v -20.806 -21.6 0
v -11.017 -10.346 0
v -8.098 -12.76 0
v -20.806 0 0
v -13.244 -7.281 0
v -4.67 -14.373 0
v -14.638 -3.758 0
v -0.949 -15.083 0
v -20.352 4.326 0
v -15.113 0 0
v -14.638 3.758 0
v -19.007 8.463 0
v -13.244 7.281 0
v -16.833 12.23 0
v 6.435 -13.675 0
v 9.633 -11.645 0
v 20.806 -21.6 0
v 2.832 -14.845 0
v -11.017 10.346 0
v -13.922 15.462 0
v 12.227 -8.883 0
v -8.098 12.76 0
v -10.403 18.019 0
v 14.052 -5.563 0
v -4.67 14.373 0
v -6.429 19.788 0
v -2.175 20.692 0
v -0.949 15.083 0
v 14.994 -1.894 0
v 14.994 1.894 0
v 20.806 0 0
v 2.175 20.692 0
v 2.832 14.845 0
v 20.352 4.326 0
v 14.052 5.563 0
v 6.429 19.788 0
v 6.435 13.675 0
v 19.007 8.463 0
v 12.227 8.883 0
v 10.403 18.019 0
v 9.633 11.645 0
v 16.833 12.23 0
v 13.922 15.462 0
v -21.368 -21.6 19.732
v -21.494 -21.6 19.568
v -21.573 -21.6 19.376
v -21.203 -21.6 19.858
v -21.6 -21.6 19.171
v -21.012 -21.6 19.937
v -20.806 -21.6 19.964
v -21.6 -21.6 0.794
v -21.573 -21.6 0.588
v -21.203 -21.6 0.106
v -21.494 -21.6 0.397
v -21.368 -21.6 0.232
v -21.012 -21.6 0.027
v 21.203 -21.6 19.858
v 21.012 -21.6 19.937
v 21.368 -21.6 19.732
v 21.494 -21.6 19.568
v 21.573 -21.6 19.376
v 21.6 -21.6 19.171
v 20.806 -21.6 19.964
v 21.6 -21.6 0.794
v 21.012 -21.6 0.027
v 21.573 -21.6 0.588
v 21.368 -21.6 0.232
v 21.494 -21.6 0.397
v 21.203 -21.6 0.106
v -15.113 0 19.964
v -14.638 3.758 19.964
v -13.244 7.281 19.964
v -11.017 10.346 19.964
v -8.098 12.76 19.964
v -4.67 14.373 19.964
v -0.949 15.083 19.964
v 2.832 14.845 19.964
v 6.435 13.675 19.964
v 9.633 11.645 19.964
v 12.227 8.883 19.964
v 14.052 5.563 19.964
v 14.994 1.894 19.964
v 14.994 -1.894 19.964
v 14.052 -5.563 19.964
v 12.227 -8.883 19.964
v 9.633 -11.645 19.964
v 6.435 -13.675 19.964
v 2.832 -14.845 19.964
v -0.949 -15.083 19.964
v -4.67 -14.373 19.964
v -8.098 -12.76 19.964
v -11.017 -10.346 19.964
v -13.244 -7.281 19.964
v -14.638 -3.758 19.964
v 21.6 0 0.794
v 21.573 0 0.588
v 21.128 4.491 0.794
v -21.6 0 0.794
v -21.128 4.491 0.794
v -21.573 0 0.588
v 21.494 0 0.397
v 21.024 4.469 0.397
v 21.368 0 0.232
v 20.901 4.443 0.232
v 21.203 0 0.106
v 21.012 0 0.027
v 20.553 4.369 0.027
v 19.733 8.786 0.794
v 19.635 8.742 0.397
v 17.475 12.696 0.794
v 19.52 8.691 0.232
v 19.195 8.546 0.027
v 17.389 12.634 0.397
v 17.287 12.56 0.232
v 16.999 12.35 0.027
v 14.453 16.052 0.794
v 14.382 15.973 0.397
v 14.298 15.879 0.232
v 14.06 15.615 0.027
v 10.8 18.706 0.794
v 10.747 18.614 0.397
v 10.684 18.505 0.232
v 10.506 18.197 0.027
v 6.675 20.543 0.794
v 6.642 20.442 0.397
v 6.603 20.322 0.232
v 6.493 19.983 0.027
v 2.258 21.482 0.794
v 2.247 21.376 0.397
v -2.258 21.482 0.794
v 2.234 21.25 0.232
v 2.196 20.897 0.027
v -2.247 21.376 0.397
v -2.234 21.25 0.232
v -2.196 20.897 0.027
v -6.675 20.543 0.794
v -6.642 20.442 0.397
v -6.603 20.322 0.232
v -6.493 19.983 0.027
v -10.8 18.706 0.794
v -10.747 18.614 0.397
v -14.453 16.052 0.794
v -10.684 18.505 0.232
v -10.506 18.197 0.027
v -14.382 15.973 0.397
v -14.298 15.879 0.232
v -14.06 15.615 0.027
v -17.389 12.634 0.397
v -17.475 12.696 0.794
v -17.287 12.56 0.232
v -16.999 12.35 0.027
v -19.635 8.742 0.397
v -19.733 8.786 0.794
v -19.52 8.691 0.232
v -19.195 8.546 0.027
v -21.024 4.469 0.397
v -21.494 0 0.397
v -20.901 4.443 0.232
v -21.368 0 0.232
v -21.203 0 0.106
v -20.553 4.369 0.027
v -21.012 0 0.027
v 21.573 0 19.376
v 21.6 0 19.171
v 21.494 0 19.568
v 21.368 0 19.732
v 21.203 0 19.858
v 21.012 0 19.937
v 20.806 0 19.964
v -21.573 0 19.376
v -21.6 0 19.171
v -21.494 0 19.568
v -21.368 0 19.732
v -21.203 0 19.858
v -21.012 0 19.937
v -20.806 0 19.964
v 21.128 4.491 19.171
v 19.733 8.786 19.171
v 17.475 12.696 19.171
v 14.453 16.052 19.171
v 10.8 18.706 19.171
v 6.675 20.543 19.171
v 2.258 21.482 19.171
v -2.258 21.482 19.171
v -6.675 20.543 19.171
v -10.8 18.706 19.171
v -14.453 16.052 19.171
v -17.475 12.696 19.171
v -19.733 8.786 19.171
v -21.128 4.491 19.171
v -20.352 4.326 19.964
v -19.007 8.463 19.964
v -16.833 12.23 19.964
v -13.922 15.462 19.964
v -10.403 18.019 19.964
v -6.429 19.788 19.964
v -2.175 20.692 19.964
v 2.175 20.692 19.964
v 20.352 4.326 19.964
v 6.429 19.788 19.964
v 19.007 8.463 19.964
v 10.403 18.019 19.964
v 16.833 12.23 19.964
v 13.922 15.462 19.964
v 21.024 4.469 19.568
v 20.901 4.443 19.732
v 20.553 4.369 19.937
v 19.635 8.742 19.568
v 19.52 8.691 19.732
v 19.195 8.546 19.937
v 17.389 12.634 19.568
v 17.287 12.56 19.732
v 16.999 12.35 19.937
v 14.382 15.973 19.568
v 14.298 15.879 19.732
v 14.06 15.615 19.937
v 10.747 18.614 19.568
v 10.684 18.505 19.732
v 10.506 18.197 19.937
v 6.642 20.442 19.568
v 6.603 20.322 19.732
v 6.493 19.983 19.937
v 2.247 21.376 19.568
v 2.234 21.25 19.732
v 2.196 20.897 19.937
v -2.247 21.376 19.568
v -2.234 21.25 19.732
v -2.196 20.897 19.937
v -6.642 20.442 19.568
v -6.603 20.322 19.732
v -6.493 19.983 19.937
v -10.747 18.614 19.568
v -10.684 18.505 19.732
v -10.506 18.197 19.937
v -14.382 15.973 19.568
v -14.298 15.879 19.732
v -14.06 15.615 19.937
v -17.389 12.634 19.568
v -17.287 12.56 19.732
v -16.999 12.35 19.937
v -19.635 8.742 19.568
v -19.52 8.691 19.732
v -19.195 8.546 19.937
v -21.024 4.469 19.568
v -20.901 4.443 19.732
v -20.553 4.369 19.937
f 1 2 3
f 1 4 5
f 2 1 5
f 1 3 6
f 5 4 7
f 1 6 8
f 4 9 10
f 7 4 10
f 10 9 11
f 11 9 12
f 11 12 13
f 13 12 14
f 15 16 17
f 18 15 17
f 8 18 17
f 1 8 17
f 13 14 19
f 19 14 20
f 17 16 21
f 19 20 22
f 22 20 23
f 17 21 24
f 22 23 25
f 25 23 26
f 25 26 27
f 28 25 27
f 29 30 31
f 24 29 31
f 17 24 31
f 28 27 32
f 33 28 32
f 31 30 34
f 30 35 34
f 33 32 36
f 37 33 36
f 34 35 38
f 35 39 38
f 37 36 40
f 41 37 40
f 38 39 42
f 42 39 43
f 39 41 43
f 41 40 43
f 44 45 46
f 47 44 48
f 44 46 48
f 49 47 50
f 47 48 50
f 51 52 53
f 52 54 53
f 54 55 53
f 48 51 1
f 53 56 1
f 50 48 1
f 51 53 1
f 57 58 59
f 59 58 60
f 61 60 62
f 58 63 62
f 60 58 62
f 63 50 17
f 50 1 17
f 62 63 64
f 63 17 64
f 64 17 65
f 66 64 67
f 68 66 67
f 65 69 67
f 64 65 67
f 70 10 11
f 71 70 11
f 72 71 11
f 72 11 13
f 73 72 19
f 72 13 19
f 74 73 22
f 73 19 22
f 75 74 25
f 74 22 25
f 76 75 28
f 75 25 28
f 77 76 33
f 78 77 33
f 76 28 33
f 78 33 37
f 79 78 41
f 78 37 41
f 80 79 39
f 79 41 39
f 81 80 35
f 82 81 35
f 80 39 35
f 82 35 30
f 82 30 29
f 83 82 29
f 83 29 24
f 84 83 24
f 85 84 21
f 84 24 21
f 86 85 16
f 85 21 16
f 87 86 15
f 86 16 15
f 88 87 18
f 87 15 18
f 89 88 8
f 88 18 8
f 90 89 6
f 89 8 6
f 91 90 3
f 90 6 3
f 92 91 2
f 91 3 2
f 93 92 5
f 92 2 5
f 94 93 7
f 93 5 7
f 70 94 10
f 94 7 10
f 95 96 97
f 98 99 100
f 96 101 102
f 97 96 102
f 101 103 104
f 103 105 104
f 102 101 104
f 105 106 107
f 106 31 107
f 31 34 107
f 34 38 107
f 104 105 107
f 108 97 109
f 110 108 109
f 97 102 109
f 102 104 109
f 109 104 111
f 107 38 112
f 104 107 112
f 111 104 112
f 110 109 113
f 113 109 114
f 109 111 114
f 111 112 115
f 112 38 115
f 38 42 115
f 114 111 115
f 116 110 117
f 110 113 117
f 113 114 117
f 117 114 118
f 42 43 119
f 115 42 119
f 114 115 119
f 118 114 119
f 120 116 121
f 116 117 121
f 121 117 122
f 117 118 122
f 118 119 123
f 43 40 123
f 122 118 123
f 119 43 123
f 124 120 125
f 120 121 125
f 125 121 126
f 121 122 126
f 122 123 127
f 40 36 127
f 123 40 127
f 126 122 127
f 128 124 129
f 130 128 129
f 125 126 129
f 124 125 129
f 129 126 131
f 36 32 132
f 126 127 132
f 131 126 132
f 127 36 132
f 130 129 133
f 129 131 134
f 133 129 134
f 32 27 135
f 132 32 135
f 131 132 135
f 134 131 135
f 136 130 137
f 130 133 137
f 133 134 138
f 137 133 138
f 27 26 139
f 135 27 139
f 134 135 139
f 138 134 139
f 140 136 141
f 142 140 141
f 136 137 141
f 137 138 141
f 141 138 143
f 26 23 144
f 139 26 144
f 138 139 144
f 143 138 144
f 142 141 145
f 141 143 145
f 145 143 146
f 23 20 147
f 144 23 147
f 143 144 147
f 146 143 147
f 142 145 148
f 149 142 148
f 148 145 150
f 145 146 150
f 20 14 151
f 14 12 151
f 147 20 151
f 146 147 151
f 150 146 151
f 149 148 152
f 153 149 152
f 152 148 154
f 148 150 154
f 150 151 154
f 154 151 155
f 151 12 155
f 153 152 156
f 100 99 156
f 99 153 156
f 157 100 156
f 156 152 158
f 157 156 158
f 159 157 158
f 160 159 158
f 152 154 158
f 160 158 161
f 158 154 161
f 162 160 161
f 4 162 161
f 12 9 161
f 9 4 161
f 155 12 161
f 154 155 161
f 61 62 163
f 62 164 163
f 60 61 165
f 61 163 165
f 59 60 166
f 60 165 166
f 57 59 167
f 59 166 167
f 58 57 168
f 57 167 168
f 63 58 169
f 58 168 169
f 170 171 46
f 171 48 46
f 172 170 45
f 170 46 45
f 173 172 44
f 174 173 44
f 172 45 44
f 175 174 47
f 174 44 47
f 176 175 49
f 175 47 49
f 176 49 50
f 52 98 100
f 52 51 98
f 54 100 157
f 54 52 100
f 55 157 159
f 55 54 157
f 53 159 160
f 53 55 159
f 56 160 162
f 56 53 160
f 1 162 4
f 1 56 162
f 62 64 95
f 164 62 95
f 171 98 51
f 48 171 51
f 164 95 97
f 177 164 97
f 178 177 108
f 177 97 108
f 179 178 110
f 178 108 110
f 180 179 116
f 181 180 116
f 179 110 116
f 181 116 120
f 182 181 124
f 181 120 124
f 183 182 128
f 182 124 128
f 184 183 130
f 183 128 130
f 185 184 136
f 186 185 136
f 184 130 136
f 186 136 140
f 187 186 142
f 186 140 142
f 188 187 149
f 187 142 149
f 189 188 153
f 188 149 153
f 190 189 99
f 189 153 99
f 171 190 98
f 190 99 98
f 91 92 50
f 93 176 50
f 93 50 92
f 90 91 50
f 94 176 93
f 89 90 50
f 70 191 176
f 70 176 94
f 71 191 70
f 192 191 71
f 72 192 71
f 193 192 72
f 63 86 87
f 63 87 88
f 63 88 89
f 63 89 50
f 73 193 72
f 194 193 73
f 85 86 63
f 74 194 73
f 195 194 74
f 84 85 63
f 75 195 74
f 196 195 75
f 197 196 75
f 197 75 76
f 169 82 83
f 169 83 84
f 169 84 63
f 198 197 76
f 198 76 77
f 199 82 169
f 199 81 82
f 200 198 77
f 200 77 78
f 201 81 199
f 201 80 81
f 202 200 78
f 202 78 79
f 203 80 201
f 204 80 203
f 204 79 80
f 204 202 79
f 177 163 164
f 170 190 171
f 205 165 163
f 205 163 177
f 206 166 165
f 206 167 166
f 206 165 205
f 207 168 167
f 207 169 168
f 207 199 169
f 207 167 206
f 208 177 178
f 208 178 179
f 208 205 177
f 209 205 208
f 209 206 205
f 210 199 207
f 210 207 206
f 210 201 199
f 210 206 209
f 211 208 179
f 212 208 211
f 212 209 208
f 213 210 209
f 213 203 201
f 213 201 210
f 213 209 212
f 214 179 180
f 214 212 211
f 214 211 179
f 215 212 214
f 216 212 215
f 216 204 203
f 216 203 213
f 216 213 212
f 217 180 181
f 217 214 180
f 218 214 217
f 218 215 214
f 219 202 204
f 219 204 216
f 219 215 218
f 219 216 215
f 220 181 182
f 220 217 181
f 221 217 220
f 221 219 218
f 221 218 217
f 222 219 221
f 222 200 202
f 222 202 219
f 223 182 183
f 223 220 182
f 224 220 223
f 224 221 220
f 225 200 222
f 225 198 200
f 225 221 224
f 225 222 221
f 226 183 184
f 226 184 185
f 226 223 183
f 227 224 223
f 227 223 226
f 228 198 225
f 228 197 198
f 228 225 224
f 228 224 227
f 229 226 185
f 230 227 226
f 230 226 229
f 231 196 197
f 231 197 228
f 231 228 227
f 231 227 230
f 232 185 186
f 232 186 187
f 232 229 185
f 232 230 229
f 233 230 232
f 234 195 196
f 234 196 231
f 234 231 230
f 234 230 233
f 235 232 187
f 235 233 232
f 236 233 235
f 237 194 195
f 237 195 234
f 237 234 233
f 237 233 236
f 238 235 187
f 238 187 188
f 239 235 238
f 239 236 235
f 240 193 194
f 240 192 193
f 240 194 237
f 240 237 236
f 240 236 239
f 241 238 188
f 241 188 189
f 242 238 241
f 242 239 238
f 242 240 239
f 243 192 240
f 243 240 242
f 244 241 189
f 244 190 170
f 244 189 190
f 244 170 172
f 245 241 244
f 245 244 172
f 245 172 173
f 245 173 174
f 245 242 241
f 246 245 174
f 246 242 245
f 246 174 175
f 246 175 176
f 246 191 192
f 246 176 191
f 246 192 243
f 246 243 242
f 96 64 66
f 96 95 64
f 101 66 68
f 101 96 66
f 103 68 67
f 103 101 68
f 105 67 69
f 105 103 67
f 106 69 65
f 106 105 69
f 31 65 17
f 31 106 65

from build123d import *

# Parameters (mm, degrees)
F1_DEPTH = 19.9644
F2_R     = 0.79375


with BuildPart() as f1:
    # F0 (on Top) → F1 (new body)
    with BuildSketch(Plane.XY):
        with BuildLine():
            Line((21.6, 0), (15.113, 0))
            ThreePointArc((15.113, 0), (0, -15.113), (-15.113, 0))
            Line((-15.113, 0), (-21.6, 0))
            ThreePointArc((-21.6, 0), (-15.2735064736, -15.2735064736), (0, -21.6))
            ThreePointArc((0, -21.6), (15.2735064736, -15.2735064736), (21.6, 0))
        make_face()
        with BuildLine():
            ThreePointArc((-15.113, 0), (0, 15.113), (15.113, 0))
            Line((15.113, 0), (21.6, 0))
            ThreePointArc((21.6, 0), (0, 21.6), (-21.6, 0))
            Line((-21.6, 0), (-15.113, 0))
        make_face()
        with BuildLine():
            Line((21.6, -21.6), (21.6, 0))
            ThreePointArc((21.6, 0), (15.2735064736, -15.2735064736), (0, -21.6))
            Line((0, -21.6), (21.6, -21.6))
        make_face()
        with BuildLine():
            ThreePointArc((0, -21.6), (-15.2735064736, -15.2735064736), (-21.6, 0))
            Line((-21.6, 0), (-21.6, -21.6))
            Line((-21.6, -21.6), (0, -21.6))
        make_face()
    extrude(amount=F1_DEPTH)

    # F2
    f2_edges = [f1.edges().sort_by_distance(p)[0] for p in [
        (0, 21.6, 0),
        (0, 21.6, 19.9644),
    ]]
    fillet(f2_edges, radius=F2_R)


solid = f1.part
